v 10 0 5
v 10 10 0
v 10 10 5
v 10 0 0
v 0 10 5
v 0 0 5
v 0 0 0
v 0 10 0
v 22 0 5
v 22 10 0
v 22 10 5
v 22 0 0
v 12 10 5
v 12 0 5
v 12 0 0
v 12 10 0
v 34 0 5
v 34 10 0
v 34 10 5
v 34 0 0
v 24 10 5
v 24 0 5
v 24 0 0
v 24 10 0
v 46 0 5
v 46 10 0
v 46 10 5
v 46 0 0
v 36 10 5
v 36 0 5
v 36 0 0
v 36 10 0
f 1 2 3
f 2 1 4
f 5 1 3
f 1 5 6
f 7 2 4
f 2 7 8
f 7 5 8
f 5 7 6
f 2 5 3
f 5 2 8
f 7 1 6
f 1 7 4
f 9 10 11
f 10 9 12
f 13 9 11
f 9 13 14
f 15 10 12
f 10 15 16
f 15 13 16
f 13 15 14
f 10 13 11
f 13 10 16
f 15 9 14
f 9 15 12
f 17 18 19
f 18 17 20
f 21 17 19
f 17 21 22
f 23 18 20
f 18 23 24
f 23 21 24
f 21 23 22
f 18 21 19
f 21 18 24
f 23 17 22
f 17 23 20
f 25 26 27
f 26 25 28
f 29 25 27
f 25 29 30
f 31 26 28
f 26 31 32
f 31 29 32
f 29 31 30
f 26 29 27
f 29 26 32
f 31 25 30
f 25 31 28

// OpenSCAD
union() {
  for (i = [0 : 3]) translate([i * 12, 0, 0]) cube([10, 10, 5]);
}
